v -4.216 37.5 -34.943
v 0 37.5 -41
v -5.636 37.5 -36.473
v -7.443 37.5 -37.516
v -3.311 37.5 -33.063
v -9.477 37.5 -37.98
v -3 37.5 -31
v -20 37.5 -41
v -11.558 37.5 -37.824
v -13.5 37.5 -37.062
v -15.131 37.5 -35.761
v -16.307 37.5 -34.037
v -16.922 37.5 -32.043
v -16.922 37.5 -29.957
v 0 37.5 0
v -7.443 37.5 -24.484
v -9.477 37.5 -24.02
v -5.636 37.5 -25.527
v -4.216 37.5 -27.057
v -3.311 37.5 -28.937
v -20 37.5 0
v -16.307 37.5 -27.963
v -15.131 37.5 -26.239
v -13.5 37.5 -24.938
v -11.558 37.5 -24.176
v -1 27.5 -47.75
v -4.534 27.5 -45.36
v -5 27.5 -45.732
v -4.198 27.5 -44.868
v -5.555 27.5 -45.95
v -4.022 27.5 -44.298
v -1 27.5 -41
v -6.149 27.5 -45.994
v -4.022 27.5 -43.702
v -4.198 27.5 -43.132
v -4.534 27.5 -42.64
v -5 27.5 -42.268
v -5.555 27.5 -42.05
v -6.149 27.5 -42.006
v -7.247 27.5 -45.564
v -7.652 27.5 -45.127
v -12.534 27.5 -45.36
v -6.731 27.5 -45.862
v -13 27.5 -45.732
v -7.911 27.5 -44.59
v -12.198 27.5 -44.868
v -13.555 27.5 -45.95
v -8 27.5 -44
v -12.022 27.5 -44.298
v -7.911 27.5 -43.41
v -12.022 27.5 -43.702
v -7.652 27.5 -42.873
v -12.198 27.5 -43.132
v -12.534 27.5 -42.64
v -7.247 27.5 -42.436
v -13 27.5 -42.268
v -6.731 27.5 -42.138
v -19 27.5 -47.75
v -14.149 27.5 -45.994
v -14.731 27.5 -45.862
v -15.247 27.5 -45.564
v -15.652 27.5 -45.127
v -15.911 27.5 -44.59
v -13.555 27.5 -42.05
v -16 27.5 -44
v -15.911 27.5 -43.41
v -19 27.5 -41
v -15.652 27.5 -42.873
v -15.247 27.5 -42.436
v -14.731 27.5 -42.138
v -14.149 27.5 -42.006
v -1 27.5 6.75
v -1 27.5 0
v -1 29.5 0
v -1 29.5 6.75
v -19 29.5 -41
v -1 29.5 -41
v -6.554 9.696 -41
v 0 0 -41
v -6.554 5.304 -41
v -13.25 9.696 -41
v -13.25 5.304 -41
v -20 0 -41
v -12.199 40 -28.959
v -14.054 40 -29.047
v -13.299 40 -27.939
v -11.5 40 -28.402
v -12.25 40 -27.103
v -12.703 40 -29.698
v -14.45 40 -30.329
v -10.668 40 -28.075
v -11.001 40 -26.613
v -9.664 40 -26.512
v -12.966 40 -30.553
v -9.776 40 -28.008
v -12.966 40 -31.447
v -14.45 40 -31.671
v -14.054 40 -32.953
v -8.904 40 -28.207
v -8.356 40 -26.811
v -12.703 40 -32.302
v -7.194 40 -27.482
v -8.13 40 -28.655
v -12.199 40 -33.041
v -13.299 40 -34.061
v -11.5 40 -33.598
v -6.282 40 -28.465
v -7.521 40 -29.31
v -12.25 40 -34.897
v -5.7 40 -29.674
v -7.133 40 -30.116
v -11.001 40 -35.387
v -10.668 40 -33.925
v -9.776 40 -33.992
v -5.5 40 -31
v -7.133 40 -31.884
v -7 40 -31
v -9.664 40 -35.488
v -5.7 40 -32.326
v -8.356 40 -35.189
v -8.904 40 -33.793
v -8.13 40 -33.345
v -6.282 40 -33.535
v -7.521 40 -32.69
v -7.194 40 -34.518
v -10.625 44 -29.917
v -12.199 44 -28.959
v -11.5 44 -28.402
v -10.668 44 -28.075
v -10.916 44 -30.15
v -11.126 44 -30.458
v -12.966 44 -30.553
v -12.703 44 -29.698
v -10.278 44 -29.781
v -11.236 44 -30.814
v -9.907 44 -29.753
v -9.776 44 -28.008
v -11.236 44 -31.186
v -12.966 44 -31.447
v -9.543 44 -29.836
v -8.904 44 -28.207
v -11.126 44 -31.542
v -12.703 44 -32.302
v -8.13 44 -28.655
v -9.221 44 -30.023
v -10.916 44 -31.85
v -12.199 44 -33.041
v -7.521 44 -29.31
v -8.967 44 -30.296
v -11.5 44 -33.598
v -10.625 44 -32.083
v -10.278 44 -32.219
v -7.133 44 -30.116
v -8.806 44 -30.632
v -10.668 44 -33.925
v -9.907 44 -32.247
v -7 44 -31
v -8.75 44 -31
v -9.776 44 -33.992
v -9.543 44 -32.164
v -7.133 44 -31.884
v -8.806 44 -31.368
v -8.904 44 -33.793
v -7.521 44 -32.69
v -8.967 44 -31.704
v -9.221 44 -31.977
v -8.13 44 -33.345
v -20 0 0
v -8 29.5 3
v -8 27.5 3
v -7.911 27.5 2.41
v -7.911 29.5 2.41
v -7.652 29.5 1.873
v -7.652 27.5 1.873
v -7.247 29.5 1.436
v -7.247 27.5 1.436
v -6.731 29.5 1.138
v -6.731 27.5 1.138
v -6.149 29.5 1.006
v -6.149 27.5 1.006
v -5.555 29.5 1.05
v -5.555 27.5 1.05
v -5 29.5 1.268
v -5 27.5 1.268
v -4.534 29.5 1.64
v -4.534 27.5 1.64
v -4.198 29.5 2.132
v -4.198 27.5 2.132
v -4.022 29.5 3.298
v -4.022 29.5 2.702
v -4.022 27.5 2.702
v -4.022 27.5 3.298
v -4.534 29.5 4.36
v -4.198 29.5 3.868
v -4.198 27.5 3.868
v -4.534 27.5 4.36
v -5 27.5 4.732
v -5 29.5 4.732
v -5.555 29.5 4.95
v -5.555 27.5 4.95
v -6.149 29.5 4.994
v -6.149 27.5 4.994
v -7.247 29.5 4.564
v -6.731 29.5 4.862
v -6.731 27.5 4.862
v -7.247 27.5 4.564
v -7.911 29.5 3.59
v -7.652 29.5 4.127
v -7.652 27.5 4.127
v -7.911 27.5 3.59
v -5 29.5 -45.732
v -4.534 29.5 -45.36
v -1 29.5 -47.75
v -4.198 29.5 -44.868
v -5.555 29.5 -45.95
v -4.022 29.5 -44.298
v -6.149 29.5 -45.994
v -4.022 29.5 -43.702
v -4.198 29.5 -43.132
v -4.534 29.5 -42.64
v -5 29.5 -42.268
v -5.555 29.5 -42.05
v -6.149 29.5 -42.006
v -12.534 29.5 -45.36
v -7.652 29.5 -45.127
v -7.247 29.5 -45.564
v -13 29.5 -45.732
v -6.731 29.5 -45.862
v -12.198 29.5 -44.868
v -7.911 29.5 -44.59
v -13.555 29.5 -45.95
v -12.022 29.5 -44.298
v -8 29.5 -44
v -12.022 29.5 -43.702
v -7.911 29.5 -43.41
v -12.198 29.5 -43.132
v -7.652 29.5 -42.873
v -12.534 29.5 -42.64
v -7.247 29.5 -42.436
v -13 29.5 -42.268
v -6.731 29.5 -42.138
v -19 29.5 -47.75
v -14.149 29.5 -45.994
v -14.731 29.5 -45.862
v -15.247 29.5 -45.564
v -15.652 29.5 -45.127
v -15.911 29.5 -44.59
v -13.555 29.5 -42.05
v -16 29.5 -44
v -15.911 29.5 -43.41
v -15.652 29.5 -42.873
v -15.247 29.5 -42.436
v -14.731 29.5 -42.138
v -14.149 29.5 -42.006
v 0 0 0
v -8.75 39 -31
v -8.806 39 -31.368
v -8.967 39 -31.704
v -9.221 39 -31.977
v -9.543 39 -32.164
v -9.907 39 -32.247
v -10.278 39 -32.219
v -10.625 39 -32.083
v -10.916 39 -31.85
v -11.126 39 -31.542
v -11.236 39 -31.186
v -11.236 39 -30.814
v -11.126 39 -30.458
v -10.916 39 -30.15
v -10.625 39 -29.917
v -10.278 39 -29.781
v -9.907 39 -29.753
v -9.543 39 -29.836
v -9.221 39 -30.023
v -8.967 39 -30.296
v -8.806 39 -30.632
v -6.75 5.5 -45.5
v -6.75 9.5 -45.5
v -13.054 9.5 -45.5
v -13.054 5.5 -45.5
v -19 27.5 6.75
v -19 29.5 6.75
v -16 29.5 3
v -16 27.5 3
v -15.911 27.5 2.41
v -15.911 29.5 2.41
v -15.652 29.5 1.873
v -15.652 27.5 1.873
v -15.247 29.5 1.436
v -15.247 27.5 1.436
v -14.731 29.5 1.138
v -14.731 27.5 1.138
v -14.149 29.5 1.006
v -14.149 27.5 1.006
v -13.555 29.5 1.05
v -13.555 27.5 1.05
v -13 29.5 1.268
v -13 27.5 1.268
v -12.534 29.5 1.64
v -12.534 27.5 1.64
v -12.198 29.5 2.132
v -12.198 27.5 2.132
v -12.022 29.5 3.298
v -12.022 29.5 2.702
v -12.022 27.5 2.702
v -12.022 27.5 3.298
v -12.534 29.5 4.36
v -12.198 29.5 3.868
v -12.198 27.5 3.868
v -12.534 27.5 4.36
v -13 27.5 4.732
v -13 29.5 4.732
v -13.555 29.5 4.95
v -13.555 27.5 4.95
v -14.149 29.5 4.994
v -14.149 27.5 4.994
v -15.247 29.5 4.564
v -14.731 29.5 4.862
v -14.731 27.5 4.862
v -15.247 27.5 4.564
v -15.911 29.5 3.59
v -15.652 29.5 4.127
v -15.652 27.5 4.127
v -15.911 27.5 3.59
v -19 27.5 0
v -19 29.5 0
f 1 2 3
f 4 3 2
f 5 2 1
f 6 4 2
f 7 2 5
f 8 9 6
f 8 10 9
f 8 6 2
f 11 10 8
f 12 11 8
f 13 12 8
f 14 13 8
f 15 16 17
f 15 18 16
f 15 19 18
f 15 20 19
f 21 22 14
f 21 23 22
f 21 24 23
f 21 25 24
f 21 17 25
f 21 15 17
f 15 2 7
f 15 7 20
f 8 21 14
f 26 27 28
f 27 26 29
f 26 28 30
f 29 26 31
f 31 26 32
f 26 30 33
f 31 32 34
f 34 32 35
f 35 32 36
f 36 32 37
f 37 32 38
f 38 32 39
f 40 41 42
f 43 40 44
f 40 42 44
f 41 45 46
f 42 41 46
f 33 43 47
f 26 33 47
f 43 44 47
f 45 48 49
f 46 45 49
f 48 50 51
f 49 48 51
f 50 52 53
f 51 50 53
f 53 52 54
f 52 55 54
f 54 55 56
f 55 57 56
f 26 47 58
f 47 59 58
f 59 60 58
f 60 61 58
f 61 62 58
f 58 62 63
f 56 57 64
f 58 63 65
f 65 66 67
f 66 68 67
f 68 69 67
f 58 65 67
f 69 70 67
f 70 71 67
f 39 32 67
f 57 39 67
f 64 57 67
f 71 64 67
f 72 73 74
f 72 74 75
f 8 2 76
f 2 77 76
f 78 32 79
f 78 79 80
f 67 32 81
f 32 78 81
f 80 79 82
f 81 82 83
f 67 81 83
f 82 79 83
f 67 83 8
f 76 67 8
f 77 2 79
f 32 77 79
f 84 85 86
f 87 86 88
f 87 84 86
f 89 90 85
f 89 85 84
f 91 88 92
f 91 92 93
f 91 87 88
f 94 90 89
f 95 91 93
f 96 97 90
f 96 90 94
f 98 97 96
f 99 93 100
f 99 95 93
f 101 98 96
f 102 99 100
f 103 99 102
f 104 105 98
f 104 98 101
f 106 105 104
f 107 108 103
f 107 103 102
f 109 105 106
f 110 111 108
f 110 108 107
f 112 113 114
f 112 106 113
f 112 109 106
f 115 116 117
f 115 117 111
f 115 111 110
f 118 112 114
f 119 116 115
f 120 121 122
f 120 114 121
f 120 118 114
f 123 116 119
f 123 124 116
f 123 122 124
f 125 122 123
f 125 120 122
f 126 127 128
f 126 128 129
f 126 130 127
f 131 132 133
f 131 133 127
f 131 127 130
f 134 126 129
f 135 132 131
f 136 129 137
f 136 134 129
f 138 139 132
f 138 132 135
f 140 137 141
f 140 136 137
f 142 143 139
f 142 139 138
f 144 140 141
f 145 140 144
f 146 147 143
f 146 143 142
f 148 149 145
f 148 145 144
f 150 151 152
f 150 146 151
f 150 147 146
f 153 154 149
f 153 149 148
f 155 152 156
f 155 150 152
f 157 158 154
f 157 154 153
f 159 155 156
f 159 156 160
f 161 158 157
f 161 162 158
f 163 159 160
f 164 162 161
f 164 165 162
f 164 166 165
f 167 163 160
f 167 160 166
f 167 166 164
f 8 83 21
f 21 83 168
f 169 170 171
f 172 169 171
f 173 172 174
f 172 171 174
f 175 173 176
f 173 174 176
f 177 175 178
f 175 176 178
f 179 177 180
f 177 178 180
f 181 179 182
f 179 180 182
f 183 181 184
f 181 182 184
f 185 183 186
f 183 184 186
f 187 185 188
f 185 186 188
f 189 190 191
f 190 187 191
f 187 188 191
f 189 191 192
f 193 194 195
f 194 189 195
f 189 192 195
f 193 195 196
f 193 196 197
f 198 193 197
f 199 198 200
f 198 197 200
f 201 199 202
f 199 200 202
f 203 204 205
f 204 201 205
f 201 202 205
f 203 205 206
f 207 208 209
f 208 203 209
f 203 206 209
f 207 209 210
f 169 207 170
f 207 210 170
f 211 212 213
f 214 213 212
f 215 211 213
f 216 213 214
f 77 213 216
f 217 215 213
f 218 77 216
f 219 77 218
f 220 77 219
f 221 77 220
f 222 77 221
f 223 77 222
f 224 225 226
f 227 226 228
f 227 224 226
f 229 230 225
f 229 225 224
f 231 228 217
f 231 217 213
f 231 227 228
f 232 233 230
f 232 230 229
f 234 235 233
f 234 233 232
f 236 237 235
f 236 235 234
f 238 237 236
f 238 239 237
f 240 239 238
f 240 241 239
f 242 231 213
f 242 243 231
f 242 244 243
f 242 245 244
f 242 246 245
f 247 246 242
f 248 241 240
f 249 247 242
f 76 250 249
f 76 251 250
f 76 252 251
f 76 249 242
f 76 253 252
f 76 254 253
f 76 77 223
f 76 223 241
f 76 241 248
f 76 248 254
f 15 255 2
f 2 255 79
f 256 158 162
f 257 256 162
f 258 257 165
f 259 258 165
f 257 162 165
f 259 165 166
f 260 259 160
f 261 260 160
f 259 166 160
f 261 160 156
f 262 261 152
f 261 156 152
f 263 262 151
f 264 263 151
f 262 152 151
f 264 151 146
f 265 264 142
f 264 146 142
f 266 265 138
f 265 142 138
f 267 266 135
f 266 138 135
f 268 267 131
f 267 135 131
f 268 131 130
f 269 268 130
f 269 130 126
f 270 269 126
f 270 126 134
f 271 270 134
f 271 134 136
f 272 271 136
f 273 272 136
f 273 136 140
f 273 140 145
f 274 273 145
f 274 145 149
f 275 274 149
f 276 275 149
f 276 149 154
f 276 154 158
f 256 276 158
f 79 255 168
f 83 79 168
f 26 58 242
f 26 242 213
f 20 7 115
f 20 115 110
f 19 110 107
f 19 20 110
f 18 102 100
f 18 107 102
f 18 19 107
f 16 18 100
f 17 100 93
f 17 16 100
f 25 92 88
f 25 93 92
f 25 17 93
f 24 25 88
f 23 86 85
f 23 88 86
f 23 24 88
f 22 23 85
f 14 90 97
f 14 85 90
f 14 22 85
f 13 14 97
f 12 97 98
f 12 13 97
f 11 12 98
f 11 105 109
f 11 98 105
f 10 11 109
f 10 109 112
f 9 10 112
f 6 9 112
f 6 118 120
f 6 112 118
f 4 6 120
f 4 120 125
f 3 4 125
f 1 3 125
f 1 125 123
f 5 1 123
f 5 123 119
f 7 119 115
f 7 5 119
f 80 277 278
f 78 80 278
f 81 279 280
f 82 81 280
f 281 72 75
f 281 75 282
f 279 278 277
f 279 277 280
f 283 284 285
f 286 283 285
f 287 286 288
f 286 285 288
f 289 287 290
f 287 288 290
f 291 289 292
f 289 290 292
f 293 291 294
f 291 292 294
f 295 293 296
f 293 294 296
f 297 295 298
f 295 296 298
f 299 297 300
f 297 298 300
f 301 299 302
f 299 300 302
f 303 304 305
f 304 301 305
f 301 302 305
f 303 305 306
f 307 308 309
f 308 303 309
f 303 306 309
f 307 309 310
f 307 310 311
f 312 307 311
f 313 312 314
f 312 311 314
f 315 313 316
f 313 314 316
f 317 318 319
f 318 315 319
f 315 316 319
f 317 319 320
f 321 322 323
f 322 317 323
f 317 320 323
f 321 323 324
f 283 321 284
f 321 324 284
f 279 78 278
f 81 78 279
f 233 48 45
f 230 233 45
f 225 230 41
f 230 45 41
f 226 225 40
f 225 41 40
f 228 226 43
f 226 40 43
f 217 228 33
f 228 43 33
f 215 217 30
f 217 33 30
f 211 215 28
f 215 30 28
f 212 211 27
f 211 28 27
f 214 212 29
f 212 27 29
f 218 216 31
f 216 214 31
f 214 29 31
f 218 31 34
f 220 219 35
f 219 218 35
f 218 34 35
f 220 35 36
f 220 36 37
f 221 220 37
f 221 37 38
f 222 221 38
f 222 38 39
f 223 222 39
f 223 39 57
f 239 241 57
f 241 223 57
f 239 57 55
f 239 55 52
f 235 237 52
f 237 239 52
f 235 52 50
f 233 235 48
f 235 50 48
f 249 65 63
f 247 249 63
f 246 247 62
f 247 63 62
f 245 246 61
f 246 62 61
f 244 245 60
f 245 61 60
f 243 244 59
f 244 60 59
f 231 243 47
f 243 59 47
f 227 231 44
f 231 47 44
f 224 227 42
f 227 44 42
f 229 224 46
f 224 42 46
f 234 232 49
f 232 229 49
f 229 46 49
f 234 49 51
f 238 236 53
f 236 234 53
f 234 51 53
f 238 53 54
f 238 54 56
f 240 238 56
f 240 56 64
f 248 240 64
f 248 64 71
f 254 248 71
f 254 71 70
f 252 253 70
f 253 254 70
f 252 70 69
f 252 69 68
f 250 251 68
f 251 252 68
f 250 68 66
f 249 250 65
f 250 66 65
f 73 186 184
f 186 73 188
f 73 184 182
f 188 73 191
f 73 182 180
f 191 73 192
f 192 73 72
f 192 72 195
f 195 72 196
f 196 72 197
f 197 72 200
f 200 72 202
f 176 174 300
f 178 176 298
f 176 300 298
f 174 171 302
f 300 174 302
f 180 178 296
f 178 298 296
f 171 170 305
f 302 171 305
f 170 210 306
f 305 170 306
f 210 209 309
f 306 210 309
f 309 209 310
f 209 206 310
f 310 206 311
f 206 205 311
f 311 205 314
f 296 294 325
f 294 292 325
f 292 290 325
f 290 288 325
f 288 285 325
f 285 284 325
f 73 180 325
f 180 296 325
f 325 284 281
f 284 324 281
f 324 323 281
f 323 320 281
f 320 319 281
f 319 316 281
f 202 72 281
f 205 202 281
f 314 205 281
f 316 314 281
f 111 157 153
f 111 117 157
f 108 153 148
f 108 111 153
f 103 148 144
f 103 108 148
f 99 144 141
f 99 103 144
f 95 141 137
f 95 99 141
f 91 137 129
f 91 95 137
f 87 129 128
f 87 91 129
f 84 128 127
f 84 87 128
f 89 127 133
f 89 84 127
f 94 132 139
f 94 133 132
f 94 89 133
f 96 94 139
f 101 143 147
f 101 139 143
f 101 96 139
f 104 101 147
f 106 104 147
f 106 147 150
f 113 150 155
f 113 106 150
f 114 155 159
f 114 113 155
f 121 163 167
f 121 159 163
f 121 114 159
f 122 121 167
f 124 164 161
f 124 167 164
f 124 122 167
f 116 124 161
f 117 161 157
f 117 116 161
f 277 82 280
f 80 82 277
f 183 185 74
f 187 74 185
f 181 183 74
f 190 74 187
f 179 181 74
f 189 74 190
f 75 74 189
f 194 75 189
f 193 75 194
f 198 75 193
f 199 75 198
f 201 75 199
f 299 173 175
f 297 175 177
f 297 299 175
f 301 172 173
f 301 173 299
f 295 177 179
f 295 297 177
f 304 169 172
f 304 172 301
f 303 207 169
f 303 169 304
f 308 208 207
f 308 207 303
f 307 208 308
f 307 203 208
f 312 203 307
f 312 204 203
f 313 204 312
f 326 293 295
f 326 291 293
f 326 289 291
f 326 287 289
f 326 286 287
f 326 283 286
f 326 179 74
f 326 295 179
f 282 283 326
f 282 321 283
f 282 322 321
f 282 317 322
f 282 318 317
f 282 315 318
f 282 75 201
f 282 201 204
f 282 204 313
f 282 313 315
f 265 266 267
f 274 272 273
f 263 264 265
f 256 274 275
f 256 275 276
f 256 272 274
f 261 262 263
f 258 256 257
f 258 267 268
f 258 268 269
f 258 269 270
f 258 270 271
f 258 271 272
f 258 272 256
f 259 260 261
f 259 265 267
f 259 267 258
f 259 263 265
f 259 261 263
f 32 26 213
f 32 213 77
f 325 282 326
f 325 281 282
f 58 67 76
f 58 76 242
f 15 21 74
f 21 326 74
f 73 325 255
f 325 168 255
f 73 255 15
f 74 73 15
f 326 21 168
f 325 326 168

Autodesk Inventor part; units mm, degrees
ref_plane "YZ Plane" through (0, 0, 0) normal (1, 0, 0) x (0, 1, 0)
ref_plane "XY Plane" through (0, 0, 0) normal (0, 0, 1) x (1, 0, 0)
sketch "Sketch1" plane through (0, 0, 0) normal (0, 1, 0) x (-1, 0, 0)
  line L0 (20, 0) -> (0, 0)
  line L1 (0, 0) -> (0, -41)
  line L2 (0, -41) -> (20, -41)
  line L3 (20, -41) -> (20, 0)
  dimension "d0" = 20
  dimension "d1" = 41
extrude "Extrusion1" add sketch "Sketch1" along normal blind 37.5
sketch "Sketch2" plane through (0, 37.5, 0) normal (0, 1, 0) x (1, 0, 0)
  circle A0 centre (-10, 31) radius 3
  line L0 (-20, 41) -> (-20, 0) projected
  line L1 (0, 41) -> (-20, 41) projected
  point P0 (0, 0)
  dimension "d4" = 6
  dimension "d5" = 10
  dimension "d6" = 10
extrude "Extrusion2" add sketch "Sketch2" along normal blind 6.5
sketch "Sketch3" plane through (0, 37.5, 0) normal (0, 1, 0) x (1, 0, 0)
  circle A0 centre (-10, 31) radius 3 projected
  circle A1 centre (-10, 31) radius 7
  point P0 (0, 0)
  dimension "d9" = 14
extrude "Extrusion3" add sketch "Sketch3" along normal blind 2.5
chamfer "Chamfer1" distance 2.5 angle 45 1 edges at (-17, 40, -31)
ref_plane "Work Plane1" through (0, 27.5, 0) normal (0, 1, 0) x (-1, 0, 0)
sketch "Sketch4" plane through (0, 27.5, 0) normal (0, 1, 0) x (-1, 0, 0)
  line L0 (19, -47.75) -> (1, -47.75)
  line L1 (1, -47.75) -> (1, 6.75)
  line L2 (1, 6.75) -> (19, 6.75)
  line L3 (19, 6.75) -> (19, -47.75)
  line L4 (0, 0) -> (0, -41) projected
  line L5 (0, -41) -> (20, -41) projected
  line L6 (14, -44) -> (6, -44) construction
  line L7 (6, -44) -> (6, 3) construction
  line L8 (6, 3) -> (14, 3) construction
  line L9 (14, 3) -> (14, -44) construction
  circle A0 centre (14, -44) radius 2
  circle A1 centre (6, -44) radius 2
  circle A2 centre (14, 3) radius 2
  circle A3 centre (6, 3) radius 2
  dimension "d16" = 54.5
  dimension "d17" = 18
  dimension "d18" = 1
  dimension "d19" = 6.75
  dimension "d20" = 47
  dimension "d21" = 8
  dimension "d22" = 5
  dimension "d23" = 3.75
  dimension "d24" = 4
  dimension "d25" = 4
  dimension "d26" = 4
  dimension "d27" = 4
extrude "Extrusion4" add sketch "Sketch4" along normal blind 2
sketch "Sketch5" plane through (-10, 44, -31) normal (0, 1, 0) x (1, 0, 0)
  circle A0 centre (0, 0) radius 3 projected
  circle A1 centre (0, 0) radius 1.25
  point P0 (10, -31)
  dimension "d30" = 2.5
extrude "Extrusion5" cut sketch "Sketch5" against normal blind 5 contours A1
sketch "Sketch6" plane through (0, 0, -41) normal (0, 0, -1) x (-1, 0, 0)
  line L0 (6.75, 9.5) -> (13.25, 9.5)
  line L1 (13.25, 9.5) -> (13.25, 5.5)
  line L2 (13.25, 5.5) -> (6.75, 5.5)
  line L3 (6.75, 5.5) -> (6.75, 9.5)
  line L4 (0, 0) -> (20, 0) projected
  line L5 (0, 0) -> (0, 37.5) projected
  dimension "d33" = 4
  dimension "d34" = 6.5
  dimension "d35" = 5.5
  dimension "d36" = 6.75
extrude "Extrusion6" add sketch "Sketch6" along normal blind 4.5
draft "FaceDraft1" angle 2.5 pull direction (0, 0, -1) faces at (-6.75, 8.1667, -42.5) fixed edges at (-6.75, 7.5, -45.5)
draft "FaceDraft2" angle 2.5 pull direction (0, 0, -1) faces at (-8.8512, 5.5, -42.5) fixed edges at (-10, 5.5, -45.5)
draft "FaceDraft3" angle 2.5 pull direction (0, 0, -1) faces at (-8.8512, 9.5, -42.5) fixed edges at (-10, 9.5, -45.5)
draft "FaceDraft4" angle 2.5 pull direction (0, 0, -1) faces at (-13.25, 6.8333, -42.5) fixed edges at (-13.25, 7.5, -41)
properties part number "HX-15CS_15KGs_metal_gear_servo"
